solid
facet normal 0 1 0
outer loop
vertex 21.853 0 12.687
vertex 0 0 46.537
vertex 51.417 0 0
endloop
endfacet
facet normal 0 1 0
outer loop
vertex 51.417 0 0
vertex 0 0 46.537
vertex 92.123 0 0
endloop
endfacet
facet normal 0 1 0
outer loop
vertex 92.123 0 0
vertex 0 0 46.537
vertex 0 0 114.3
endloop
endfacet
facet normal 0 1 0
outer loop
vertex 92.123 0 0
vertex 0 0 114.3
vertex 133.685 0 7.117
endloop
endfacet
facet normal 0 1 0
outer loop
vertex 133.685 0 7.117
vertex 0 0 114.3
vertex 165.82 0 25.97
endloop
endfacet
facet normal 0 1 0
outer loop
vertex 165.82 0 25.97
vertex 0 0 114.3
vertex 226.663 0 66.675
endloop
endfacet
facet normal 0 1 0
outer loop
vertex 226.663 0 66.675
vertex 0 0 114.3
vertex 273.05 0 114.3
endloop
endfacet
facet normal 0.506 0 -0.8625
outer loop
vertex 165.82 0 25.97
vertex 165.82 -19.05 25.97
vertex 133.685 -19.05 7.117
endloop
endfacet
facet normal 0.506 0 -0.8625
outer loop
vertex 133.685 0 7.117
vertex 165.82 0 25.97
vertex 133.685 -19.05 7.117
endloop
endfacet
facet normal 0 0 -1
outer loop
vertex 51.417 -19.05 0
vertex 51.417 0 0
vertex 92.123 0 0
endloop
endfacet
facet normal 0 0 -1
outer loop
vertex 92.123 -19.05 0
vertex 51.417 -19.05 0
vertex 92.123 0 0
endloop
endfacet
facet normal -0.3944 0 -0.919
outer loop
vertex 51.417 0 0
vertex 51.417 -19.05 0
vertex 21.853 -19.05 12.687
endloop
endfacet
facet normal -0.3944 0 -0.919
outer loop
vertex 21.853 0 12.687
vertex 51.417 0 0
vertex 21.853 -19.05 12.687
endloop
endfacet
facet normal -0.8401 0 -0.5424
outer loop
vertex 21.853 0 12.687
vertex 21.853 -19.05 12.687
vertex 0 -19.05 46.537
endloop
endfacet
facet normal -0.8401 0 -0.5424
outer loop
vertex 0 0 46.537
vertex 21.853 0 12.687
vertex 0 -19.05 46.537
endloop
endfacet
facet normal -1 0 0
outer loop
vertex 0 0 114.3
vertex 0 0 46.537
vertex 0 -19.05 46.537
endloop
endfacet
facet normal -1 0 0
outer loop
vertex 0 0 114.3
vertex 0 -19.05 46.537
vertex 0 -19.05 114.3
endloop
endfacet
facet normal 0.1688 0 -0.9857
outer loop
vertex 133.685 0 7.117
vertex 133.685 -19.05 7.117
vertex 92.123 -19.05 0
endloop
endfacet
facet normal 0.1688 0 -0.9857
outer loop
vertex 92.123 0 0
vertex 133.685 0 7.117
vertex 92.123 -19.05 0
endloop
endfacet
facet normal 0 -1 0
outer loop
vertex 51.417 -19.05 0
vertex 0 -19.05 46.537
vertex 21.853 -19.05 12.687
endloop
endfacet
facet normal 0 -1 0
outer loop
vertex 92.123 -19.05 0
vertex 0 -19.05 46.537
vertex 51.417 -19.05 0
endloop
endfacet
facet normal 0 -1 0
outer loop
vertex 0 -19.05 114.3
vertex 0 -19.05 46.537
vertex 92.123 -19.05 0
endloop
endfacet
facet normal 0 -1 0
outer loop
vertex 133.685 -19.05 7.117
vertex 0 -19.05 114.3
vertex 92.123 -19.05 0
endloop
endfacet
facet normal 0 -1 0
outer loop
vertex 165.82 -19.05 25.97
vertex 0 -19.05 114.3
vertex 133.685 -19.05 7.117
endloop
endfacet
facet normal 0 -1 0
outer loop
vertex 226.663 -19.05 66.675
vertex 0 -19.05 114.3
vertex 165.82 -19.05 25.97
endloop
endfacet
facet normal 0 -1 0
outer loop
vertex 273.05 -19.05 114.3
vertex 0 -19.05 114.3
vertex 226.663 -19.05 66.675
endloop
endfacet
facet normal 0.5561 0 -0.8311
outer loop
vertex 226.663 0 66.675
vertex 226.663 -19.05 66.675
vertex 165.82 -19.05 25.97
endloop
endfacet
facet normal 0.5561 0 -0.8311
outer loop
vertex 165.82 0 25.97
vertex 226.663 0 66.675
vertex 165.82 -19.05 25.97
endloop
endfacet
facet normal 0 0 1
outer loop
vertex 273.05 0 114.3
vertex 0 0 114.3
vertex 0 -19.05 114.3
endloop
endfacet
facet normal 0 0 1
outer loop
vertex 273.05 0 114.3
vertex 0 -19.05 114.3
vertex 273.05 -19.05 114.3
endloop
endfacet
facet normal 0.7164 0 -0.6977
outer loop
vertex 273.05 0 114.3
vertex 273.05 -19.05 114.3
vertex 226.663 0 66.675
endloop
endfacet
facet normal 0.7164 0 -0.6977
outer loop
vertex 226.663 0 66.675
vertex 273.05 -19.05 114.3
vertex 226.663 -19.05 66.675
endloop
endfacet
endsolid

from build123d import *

# Parameters (mm, degrees)
F0_W     = 273.05
F0_H     = 114.3
F1_DEPTH = 19.05
F3_DEPTH = 25.4


with BuildPart() as f1:
    # F0 (on Front) → F1 (new body)
    with BuildSketch(Plane.XZ):
        with Locations((136.525, 57.15)):
            Rectangle(F0_W, F0_H)
    extrude(amount=F1_DEPTH)

    # F2 (on face) → F3 (cut)
    with BuildSketch(Plane.XZ.offset(19.05)):
        Polygon((21.852773, 12.687119), (0, 46.53658), (0, 0), (51.417489, 0), align=None)
        Polygon((273.05, 0), (273.05, 114.3), (226.663426, 66.674866), (165.820092, 25.969818), (133.684531, 7.116954), (92.12254, 0), align=None)
    extrude(amount=-F3_DEPTH, mode=Mode.SUBTRACT)


solid = f1.part
